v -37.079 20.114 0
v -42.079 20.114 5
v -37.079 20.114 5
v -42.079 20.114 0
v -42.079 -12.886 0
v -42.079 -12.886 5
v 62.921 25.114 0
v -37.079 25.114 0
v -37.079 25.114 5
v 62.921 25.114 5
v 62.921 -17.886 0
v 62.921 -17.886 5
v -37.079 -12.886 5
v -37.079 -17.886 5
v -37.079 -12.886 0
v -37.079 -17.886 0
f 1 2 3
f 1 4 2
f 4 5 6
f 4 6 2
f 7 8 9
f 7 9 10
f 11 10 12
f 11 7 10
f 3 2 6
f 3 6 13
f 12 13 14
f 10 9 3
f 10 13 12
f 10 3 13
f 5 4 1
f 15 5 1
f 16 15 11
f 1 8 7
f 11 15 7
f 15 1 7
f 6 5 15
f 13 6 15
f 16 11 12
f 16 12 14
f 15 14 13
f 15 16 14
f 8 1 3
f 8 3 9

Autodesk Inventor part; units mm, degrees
ref_plane "YZ Plane" through (0, 0, 0) normal (1, 0, 0) x (0, 1, 0)
ref_plane "XZ Plane" through (0, 0, 0) normal (0, 1, 0) x (-1, 0, 0)
ref_plane "XY Plane" through (0, 0, 0) normal (0, 0, 1) x (1, 0, 0)
sketch "Sketch1" plane through (0, 0, 0) normal (0, 0, 1) x (1, 0, 0)
  line L0 (-62.0787, -12.8855) -> (-42.0787, -12.8855) construction
  line L1 (-42.0787, -12.8855) -> (-42.0787, 20.1145)
  line L2 (-42.0787, 20.1145) -> (-37.0787, 20.1145)
  line L3 (-37.0787, 20.1145) -> (-37.0787, 25.1145)
  line L4 (-37.0787, 25.1145) -> (62.9213, 25.1145)
  line L5 (-42.0787, -12.8855) -> (-37.0787, -12.8855)
  line L6 (62.9213, -17.8855) -> (-37.0787, -17.8855)
  line L7 (-37.0787, -17.8855) -> (-37.0787, -12.8855)
  line L8 (62.9213, 25.1145) -> (62.9213, -17.8855)
  point P0 (0, 0)
  dimension "d1" = 33
  dimension "d2" = 5
  dimension "d3" = 5
  dimension "d4" = 100
  dimension "d9" = 5
extrude "Extrusion1" add sketch "Sketch1" along normal blind 5
properties part number "floor1"
